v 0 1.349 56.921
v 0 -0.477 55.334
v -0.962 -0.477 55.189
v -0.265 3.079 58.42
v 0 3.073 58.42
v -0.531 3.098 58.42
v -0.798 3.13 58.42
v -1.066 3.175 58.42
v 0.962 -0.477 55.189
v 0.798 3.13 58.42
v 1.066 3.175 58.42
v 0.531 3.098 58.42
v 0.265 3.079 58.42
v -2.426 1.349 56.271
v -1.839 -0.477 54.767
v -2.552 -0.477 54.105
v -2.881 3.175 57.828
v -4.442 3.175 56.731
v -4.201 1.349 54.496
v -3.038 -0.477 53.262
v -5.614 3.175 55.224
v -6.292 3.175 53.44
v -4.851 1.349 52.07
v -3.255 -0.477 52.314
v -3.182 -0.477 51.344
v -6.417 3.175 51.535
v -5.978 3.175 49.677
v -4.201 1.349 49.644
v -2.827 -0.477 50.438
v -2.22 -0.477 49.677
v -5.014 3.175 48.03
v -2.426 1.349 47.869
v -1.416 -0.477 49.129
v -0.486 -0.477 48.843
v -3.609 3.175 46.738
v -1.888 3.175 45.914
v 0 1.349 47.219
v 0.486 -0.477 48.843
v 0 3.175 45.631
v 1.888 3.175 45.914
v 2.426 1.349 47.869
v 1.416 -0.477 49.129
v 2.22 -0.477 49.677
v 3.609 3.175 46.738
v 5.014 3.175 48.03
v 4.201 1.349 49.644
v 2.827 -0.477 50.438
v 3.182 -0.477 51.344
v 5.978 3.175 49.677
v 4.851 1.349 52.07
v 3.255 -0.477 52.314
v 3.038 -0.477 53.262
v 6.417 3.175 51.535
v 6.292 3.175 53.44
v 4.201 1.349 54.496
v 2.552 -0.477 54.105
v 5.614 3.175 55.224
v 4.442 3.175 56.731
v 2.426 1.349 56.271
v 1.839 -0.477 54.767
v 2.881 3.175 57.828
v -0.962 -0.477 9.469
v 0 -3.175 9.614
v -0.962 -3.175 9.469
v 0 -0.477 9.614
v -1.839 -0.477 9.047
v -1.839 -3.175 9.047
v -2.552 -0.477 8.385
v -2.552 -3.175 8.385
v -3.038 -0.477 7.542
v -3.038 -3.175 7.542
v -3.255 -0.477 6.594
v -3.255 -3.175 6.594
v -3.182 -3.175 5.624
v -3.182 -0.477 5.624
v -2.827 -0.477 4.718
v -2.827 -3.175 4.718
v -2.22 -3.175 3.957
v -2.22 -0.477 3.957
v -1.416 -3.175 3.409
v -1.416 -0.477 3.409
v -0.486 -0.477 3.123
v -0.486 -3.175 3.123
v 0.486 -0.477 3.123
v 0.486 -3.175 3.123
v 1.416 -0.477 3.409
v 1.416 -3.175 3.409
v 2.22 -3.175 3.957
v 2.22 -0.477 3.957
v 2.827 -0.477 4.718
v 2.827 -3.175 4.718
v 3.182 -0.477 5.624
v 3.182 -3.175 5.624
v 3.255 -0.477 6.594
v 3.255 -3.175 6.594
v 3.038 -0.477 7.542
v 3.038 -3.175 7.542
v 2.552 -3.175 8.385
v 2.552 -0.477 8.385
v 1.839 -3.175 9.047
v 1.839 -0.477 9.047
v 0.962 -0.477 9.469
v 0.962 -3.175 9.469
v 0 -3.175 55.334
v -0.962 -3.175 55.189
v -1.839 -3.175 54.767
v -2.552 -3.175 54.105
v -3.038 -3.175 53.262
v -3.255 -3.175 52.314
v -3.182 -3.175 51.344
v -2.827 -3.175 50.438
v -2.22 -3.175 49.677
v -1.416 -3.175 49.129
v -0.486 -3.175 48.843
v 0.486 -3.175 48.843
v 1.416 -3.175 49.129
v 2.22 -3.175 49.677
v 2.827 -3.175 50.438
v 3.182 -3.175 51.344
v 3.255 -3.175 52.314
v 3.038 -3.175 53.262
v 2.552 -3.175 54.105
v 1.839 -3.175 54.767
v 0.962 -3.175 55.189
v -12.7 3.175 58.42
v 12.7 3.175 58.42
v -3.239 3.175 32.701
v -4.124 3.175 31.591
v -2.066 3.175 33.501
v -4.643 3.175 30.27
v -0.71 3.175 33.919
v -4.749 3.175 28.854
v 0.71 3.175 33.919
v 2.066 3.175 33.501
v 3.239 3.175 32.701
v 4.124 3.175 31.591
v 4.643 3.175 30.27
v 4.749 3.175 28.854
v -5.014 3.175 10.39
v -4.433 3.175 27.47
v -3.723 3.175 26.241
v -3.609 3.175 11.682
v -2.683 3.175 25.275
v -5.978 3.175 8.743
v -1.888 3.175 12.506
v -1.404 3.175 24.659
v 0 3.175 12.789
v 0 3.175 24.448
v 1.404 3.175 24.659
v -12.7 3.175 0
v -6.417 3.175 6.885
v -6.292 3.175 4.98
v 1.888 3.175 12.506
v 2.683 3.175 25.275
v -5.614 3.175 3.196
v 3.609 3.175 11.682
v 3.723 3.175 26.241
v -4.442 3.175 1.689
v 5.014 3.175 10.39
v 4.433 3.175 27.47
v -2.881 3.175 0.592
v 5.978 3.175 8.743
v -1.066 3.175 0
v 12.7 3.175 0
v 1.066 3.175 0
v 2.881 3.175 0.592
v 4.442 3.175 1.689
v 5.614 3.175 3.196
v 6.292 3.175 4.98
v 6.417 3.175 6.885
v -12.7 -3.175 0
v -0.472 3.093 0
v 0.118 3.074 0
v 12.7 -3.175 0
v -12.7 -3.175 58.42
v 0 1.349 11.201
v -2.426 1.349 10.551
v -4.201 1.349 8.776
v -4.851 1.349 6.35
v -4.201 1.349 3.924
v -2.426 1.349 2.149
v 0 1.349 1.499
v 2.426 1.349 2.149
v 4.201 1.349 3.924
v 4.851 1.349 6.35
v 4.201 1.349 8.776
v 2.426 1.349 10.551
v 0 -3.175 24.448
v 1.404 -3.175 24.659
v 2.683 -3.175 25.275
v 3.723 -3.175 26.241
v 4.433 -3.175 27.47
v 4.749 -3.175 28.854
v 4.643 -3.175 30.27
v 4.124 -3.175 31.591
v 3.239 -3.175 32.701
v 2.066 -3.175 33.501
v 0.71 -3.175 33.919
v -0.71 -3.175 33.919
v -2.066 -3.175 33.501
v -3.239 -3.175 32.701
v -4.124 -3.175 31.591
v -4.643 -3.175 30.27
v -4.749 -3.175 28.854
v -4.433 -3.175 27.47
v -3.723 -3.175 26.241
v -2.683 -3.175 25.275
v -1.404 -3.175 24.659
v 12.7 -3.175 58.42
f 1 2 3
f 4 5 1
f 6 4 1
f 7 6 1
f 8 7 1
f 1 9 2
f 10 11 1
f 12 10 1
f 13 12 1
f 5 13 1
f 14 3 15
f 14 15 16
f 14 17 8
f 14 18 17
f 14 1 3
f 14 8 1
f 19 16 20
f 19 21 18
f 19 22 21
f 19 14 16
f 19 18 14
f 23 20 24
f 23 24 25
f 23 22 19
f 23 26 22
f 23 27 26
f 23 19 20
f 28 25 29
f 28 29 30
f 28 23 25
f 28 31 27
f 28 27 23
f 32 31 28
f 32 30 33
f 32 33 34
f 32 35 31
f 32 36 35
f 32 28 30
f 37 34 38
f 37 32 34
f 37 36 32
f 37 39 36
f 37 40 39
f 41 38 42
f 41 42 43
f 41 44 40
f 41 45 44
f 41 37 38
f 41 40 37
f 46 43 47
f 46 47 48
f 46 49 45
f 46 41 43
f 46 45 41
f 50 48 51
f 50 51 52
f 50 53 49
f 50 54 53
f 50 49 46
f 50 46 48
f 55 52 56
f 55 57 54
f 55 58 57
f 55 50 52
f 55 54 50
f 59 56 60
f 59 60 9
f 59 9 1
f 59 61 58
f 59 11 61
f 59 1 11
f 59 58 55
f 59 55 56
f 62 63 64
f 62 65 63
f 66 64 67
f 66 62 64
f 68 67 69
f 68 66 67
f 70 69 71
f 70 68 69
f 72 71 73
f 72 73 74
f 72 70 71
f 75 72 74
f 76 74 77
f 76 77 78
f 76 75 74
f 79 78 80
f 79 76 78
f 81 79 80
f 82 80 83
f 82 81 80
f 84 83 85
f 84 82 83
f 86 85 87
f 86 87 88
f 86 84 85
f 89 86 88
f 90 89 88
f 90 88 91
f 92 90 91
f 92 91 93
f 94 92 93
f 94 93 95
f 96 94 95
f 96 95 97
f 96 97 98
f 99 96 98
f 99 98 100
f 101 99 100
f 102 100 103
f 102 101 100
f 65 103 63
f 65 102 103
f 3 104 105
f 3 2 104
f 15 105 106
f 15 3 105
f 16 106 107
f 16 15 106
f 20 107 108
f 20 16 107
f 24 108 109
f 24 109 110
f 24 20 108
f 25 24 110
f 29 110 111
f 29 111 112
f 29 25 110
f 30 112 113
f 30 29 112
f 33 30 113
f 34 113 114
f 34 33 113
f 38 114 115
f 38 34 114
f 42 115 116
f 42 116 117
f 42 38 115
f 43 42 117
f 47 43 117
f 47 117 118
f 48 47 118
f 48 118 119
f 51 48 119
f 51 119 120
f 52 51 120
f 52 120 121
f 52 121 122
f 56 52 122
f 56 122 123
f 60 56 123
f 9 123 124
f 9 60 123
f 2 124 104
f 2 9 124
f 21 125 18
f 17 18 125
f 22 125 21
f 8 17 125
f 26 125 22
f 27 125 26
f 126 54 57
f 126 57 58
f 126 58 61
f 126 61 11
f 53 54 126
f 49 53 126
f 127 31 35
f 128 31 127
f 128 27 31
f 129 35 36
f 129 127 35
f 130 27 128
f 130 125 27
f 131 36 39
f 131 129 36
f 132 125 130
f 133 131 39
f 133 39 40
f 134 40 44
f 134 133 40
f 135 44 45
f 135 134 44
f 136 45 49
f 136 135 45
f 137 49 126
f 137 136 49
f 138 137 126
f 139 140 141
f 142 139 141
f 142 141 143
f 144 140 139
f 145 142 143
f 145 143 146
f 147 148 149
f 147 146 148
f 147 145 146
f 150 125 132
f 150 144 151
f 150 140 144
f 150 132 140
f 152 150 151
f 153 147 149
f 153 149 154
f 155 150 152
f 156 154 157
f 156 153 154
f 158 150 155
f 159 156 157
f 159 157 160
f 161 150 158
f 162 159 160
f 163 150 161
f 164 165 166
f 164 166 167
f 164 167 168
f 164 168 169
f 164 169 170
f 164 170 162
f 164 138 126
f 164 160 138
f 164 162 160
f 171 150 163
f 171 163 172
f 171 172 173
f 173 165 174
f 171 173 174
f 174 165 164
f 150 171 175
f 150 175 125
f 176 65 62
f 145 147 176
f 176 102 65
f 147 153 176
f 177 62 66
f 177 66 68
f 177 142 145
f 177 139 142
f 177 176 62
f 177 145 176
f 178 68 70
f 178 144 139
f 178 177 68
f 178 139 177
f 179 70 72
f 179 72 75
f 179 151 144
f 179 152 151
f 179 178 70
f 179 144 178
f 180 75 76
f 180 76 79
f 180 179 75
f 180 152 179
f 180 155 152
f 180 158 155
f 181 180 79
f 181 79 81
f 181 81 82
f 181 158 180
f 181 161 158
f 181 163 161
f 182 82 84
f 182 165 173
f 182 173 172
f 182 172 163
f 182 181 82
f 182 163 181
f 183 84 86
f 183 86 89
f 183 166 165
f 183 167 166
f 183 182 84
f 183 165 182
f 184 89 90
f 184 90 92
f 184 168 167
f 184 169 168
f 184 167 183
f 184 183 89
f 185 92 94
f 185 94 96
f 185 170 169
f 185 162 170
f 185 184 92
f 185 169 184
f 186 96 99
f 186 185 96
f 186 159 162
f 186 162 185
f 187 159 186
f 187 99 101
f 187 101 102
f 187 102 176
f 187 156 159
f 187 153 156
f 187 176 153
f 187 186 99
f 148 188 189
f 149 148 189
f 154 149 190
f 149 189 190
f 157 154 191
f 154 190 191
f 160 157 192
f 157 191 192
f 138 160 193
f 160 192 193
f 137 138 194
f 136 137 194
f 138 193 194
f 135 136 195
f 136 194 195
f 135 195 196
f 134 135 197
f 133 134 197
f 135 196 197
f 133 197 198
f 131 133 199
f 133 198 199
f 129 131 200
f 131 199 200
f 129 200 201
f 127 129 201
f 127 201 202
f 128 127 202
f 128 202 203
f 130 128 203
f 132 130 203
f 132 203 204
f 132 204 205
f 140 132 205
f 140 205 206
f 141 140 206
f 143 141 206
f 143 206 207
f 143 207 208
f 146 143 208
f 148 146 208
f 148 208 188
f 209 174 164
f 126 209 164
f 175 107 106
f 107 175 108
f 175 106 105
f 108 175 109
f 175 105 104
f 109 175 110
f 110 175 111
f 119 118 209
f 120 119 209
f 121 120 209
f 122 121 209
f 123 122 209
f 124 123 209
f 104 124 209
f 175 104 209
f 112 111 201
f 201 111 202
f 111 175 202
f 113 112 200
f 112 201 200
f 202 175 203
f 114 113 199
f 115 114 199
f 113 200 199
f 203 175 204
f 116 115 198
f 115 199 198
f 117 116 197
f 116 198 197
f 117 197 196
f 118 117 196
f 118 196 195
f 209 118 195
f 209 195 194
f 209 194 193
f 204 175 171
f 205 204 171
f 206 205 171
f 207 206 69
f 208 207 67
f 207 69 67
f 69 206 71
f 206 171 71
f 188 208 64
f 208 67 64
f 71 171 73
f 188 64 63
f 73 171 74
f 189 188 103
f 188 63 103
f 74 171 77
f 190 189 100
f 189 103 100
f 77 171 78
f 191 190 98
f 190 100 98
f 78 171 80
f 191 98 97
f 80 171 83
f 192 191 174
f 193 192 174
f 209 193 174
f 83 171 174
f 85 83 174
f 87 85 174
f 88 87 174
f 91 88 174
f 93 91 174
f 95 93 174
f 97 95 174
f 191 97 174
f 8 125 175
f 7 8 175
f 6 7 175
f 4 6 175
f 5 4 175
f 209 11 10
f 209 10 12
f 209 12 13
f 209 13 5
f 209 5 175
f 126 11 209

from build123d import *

# Parameters (mm, degrees)
SKETCH1_W                                     = 25.4
SKETCH1_H                                     = 6.35
EXTRUDE1_DEPTH                                = 58.42
CSK_FOR_1_4_FLAT_HEAD_MACHINE_SCREW1_AT_COUNT = 2
CSK_FOR_1_4_FLAT_HEAD_MACHINE_SCREW1_AT_PITCH = 45.72
F_3_8_0_375_DIAMETER_HOLE1_D                  = 9.525


with BuildPart() as part:
    # Sketch1 → Extrude1 (new body)
    with BuildSketch(Plane.XY):
        Rectangle(SKETCH1_W, SKETCH1_H)
    extrude(amount=EXTRUDE1_DEPTH)

    # Sketch3 → CSK for 1/4 Flat Head Machine Screw1 (revolve, cut)
    with BuildSketch(Plane(origin=(0, 3.175, 6.35), x_dir=(0, 0, 1), z_dir=(1, 0, 0))):
        Polygon((0, 0), (0, 6.35), (3.2639, 6.35), (3.2639, 3.652419693), (6.4389, 0), align=None)
    csk_for_1_4_flat_head_machine_screw1 = revolve(axis=Axis((0, 9.525, 6.35), (0, -1, 0)), mode=Mode.SUBTRACT)

    # CSK for 1/4 Flat Head Machine Screw1 at: CSK for 1/4 Flat Head Machine Screw1 ×2
    with Locations(*[(0, 0, i * CSK_FOR_1_4_FLAT_HEAD_MACHINE_SCREW1_AT_PITCH) for i in range(1, CSK_FOR_1_4_FLAT_HEAD_MACHINE_SCREW1_AT_COUNT)]):
        add(csk_for_1_4_flat_head_machine_screw1, mode=Mode.SUBTRACT)

    # 3/8 (0.375) Diameter Hole1 (through all)
    with Locations(Plane(origin=(0, 3.175, 29.21), x_dir=(0, 0, 1), z_dir=(0, 1, 0))):
        with Locations((0, 0)):
            Hole(F_3_8_0_375_DIAMETER_HOLE1_D / 2)


solid = part.part
